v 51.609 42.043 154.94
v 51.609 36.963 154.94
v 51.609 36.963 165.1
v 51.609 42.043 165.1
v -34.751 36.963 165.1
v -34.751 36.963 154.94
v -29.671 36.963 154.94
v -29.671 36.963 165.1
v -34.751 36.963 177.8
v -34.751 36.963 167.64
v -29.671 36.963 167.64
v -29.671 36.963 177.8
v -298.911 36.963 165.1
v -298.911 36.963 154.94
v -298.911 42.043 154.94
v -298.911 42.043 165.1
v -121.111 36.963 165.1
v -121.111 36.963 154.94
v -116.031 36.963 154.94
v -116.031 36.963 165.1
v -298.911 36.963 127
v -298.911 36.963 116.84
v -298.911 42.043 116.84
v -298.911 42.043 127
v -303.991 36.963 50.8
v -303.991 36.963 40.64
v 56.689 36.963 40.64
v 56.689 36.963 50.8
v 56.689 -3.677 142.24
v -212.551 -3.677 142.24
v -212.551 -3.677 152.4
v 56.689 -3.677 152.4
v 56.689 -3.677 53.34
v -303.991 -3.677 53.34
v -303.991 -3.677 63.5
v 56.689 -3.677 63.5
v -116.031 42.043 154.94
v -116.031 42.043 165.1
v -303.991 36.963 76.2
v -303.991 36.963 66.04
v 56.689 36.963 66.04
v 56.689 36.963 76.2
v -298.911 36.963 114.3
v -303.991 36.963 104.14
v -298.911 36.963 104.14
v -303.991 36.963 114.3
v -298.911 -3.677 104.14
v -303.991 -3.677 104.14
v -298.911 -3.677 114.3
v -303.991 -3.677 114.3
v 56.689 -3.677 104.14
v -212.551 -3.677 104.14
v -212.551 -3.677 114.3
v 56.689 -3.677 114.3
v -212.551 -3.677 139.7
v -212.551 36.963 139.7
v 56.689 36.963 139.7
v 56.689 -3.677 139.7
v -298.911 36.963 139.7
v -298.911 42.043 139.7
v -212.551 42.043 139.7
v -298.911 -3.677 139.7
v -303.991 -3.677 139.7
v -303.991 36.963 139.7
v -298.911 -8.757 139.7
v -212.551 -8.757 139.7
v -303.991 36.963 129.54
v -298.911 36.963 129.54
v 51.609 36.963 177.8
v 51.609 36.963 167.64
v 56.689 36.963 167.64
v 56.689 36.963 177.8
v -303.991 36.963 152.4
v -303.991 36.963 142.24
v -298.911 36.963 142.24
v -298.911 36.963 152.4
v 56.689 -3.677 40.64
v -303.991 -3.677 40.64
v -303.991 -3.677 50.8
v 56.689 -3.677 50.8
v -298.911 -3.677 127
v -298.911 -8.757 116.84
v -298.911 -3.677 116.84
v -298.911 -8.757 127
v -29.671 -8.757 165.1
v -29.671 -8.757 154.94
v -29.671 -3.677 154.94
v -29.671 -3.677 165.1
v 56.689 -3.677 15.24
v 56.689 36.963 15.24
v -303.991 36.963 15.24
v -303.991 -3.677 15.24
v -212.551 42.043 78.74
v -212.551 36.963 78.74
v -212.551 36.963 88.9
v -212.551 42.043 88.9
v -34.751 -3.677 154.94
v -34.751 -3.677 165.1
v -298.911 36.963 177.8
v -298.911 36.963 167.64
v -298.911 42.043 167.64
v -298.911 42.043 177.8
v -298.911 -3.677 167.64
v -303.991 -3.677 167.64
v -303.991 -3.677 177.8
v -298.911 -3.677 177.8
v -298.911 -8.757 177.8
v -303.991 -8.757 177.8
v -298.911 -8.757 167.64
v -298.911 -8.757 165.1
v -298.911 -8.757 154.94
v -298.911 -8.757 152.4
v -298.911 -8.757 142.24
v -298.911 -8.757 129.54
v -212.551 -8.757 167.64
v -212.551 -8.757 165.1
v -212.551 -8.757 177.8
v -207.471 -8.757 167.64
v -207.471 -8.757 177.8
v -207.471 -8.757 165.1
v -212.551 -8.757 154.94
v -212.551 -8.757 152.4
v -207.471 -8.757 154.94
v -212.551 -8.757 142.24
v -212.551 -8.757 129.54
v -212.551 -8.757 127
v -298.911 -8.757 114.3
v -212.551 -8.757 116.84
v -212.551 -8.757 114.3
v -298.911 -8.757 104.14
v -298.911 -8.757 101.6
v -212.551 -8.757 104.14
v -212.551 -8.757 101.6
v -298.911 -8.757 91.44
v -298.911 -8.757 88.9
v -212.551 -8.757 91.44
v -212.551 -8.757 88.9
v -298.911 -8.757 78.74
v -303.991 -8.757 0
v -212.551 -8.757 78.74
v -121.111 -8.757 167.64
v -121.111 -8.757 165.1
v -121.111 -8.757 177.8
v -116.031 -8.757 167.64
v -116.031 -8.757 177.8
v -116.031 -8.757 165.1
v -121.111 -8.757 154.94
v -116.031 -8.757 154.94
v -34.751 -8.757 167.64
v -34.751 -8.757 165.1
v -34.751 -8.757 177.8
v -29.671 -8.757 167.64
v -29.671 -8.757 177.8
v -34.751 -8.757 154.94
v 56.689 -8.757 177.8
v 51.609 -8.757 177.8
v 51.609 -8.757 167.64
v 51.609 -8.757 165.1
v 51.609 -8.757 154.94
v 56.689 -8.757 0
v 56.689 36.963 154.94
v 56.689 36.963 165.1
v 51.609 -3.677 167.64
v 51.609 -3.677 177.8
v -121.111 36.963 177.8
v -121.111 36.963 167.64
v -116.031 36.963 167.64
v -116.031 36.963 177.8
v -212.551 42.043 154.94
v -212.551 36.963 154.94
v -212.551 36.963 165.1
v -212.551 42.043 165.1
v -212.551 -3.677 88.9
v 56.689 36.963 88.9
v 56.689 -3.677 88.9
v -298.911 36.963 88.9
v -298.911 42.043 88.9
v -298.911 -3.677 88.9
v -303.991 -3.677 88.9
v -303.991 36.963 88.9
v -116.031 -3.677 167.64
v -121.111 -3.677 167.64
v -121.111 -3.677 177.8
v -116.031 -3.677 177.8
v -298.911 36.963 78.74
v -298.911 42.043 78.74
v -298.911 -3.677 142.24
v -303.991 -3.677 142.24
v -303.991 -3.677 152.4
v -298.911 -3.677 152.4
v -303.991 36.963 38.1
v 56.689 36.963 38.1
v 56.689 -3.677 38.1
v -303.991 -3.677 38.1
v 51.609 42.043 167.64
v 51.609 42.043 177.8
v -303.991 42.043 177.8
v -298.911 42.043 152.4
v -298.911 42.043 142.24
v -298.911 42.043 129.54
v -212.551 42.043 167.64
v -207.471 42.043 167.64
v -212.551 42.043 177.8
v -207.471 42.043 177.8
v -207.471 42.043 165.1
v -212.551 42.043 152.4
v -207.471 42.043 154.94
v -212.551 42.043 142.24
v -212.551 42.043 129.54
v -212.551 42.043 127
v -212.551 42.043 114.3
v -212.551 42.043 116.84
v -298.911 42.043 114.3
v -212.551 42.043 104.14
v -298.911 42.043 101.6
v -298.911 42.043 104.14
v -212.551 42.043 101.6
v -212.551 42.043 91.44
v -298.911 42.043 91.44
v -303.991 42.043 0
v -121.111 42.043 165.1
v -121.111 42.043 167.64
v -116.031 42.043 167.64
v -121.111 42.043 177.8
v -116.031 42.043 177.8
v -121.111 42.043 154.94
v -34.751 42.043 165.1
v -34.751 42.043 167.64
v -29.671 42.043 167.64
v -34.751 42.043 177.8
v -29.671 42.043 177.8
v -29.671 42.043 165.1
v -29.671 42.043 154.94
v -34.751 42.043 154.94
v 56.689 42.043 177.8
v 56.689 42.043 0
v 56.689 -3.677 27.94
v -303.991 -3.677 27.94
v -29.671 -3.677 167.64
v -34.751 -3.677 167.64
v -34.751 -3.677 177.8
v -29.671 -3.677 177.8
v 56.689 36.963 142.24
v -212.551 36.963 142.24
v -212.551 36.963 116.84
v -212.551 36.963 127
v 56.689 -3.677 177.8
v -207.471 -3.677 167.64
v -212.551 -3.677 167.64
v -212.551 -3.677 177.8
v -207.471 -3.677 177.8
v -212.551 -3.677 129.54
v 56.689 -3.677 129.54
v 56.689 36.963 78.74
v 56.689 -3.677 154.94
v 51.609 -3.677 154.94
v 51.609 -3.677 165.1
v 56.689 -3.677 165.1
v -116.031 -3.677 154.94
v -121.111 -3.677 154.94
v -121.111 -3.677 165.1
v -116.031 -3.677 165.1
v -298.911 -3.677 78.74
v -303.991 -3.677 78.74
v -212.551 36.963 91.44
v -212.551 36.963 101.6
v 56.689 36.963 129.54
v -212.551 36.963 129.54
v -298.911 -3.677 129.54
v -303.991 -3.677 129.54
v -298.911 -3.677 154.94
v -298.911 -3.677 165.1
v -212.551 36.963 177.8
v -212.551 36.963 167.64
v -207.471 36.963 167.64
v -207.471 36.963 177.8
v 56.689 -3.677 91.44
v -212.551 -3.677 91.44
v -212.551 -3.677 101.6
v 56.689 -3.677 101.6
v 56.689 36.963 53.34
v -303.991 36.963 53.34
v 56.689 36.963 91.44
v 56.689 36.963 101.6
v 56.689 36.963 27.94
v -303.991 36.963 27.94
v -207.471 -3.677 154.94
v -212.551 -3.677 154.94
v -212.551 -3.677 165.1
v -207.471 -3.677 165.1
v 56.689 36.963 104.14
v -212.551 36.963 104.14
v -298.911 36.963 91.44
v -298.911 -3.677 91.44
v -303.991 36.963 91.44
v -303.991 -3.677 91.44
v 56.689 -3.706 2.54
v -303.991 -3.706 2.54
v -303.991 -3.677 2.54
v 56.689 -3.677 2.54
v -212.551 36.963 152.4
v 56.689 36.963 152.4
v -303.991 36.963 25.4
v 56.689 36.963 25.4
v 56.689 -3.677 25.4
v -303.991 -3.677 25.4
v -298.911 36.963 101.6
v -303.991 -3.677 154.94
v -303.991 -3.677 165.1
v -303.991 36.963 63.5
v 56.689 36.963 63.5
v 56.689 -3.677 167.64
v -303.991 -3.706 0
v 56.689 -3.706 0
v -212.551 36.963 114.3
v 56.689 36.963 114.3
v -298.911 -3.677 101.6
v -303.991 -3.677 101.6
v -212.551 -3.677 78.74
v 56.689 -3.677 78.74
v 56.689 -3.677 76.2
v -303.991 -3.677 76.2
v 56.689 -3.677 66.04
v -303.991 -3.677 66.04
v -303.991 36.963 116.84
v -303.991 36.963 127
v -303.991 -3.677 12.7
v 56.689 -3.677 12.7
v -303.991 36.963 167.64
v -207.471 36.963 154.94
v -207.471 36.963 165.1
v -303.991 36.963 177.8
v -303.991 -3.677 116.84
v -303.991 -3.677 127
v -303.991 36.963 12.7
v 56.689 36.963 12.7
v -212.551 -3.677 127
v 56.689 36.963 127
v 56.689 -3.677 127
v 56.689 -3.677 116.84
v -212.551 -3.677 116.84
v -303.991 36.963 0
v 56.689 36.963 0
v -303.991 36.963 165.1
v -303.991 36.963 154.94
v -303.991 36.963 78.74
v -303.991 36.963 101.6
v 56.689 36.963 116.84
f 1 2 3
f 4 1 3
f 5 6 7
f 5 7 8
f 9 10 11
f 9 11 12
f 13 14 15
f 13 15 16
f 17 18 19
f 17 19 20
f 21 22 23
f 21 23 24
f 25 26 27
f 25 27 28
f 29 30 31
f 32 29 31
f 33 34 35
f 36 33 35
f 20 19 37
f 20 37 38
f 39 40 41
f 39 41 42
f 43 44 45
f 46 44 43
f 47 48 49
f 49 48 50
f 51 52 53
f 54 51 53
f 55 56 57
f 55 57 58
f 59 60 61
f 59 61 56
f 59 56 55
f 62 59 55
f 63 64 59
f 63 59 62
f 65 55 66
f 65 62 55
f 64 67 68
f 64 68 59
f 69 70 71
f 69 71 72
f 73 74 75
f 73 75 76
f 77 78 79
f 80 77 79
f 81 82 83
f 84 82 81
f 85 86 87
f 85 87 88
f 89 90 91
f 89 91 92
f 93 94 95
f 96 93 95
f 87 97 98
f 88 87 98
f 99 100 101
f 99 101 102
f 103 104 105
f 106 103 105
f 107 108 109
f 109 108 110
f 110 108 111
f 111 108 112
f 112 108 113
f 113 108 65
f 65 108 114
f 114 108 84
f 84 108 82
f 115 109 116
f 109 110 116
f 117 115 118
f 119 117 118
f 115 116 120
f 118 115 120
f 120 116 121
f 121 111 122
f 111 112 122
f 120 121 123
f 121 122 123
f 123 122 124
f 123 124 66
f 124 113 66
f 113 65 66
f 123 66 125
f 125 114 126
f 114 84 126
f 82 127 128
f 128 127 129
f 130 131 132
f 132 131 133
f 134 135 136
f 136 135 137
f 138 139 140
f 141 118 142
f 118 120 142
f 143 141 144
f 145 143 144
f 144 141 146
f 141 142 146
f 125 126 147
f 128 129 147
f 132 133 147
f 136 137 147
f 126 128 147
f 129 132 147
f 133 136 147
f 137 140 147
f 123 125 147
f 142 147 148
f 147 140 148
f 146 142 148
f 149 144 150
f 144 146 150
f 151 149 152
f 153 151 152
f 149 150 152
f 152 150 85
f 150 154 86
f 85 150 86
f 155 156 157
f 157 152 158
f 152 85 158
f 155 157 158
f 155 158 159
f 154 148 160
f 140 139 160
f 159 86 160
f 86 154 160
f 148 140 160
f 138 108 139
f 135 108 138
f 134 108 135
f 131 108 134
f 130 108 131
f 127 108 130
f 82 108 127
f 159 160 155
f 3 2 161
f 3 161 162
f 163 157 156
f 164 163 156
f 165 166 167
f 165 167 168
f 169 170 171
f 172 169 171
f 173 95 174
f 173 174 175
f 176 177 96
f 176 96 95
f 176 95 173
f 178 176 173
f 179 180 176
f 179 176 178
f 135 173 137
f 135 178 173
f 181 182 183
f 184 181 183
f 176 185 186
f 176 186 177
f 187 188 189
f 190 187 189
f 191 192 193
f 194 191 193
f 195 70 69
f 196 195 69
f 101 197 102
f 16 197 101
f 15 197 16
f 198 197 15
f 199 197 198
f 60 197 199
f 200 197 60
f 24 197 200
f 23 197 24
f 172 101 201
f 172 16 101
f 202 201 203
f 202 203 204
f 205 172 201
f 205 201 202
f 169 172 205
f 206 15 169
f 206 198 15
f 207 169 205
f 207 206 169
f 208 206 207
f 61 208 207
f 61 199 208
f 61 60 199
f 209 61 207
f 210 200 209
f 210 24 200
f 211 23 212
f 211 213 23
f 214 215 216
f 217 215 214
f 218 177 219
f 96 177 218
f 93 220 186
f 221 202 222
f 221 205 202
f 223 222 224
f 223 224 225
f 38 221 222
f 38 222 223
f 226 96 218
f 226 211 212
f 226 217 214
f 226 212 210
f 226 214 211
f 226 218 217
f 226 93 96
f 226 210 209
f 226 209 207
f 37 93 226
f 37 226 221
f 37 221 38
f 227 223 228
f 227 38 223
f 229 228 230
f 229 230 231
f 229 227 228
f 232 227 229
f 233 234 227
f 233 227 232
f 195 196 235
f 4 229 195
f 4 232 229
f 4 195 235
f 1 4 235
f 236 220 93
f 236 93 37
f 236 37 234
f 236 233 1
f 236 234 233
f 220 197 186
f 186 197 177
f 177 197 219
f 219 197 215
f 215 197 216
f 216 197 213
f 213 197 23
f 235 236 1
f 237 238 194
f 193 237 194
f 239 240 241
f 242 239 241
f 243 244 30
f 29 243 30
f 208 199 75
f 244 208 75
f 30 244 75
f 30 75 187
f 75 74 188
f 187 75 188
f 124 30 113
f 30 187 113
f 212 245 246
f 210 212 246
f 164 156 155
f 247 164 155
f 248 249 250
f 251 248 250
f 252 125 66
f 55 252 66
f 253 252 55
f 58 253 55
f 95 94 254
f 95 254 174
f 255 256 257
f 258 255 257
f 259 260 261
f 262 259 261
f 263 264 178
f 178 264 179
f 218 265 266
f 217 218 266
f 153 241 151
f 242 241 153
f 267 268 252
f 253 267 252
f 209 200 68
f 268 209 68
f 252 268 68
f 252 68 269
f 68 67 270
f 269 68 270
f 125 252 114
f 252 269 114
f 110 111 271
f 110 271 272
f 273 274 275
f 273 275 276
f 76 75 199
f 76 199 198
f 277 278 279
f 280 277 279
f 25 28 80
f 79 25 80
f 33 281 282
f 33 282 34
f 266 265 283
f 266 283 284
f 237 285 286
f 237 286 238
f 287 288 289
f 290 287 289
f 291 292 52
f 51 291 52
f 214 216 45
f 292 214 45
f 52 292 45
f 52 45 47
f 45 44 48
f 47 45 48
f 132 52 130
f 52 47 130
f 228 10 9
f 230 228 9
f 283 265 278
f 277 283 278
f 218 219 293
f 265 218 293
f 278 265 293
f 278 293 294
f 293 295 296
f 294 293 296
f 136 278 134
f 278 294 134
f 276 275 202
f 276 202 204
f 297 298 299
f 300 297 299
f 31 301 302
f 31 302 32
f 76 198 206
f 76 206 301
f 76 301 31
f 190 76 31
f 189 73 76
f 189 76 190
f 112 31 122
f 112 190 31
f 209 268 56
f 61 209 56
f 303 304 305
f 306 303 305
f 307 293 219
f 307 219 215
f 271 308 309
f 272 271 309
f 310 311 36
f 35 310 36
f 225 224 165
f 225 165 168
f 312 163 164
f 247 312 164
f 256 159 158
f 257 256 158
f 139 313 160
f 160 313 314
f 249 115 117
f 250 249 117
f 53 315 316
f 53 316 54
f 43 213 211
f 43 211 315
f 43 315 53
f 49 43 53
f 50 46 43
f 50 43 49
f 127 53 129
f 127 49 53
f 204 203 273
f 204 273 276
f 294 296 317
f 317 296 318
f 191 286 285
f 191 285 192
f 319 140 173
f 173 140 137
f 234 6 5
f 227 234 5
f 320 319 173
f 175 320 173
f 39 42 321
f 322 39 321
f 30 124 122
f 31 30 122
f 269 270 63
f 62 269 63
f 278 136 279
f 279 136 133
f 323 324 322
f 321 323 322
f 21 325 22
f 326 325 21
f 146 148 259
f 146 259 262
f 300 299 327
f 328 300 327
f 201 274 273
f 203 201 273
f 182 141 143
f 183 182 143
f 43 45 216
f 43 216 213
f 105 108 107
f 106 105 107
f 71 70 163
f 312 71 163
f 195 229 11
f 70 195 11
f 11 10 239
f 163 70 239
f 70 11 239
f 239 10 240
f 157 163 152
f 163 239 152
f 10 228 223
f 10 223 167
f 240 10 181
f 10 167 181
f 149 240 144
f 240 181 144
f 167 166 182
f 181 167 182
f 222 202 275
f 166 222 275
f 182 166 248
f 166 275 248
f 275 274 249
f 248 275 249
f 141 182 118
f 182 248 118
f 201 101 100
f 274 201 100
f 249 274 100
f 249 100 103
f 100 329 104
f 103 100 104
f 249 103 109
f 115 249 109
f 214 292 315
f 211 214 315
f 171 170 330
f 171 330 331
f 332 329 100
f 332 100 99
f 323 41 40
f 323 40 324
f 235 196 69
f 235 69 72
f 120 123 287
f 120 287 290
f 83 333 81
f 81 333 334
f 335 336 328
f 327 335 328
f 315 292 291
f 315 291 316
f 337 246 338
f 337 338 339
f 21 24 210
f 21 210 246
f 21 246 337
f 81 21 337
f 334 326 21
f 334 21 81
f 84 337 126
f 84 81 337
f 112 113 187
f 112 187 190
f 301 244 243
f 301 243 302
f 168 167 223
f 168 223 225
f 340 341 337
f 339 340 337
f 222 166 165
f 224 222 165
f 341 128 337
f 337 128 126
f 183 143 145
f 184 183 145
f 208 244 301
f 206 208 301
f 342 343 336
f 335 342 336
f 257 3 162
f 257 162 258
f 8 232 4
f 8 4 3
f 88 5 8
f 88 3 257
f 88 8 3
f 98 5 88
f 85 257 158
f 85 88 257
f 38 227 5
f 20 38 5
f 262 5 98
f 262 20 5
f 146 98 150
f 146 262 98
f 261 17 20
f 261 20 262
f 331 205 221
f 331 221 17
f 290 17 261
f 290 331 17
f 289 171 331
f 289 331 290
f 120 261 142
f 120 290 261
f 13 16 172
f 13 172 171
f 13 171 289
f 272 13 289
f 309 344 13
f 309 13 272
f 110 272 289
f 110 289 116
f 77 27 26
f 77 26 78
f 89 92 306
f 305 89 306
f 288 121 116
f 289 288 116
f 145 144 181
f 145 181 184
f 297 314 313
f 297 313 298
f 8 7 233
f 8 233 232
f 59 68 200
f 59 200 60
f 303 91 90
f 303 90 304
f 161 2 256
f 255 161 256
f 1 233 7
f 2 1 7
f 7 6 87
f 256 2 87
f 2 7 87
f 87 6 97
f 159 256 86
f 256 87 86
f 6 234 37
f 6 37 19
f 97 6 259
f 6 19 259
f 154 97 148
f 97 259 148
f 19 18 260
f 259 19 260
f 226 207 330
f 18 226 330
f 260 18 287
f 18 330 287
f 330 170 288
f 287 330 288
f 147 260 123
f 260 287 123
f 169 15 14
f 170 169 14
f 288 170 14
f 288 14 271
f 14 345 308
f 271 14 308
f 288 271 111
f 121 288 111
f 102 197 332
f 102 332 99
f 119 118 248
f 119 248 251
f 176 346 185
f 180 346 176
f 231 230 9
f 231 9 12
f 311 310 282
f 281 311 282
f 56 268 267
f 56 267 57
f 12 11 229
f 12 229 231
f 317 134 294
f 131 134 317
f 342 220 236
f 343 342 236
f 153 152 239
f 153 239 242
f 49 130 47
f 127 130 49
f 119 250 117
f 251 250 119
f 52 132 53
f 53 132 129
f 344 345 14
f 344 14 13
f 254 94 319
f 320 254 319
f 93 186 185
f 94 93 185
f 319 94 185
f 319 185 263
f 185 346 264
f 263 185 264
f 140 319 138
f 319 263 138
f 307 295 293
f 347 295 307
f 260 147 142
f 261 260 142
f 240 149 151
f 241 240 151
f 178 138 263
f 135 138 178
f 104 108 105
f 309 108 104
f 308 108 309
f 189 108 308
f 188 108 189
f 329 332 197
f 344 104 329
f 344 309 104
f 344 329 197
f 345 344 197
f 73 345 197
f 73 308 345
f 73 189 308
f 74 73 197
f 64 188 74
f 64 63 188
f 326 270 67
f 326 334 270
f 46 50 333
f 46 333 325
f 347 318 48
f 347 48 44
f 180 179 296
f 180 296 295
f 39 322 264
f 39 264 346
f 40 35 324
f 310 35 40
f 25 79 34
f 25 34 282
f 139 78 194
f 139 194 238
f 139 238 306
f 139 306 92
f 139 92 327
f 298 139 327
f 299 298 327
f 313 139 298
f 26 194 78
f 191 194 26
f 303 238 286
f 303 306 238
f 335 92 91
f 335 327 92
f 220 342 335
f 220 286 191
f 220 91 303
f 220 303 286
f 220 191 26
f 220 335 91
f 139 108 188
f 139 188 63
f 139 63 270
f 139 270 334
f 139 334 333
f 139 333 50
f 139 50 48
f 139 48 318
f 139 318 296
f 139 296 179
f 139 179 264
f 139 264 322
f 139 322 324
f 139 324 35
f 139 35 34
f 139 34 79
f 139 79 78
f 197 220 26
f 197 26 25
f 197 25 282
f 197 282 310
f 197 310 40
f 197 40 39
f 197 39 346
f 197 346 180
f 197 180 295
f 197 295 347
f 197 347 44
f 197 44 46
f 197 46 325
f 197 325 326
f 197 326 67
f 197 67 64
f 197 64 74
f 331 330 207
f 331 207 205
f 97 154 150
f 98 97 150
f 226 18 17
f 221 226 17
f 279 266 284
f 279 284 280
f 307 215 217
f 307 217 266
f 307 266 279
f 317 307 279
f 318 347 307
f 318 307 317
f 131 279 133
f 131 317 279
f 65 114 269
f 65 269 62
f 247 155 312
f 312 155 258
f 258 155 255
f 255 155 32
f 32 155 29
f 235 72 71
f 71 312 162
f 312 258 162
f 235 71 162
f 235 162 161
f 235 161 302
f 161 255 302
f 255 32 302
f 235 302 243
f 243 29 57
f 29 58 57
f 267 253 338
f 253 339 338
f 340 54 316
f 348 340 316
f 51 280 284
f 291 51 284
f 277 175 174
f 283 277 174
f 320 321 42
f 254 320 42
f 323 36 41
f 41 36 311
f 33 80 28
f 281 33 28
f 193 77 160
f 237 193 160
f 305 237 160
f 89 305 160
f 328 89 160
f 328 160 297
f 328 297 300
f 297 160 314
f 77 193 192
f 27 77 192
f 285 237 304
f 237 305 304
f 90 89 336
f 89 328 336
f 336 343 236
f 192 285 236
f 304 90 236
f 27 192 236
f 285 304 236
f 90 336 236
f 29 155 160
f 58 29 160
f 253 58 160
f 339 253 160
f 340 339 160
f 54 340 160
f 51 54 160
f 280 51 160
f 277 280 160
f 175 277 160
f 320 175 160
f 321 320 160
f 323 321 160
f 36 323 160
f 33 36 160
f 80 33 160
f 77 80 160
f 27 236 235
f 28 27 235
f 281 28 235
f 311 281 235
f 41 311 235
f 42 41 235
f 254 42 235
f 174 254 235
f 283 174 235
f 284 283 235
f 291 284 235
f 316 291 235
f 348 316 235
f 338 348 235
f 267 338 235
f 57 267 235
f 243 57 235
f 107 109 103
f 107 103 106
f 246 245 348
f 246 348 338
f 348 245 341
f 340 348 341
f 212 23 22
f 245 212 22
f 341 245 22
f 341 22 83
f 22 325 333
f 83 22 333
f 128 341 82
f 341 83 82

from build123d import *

# Parameters (mm, degrees)
F0_W     = 360.68
F0_H     = 50.8
F1_DEPTH = 177.8
F2_W     = 40.64
F2_H     = 10.16
F2_H_2   = 7.62
F2_H_3   = 2.54
F3_DEPTH = 360.681
F4_W     = 86.36
F4_H     = 10.16
F4_W_2   = 81.28
F5_DEPTH = 50.801
F7_DEPTH = 360.681


with BuildPart() as f1:
    # F0 (on Top) → F1 (new body)
    with BuildSketch(Plane.XY):
        with Locations((-123.650887, 16.643145)):
            Rectangle(F0_W, F0_H)
    extrude(amount=F1_DEPTH)

    # F2 (on face) → F3 (cut, through all)
    with BuildSketch(Plane(origin=(-303.990887, 0, 0), x_dir=(0, -1, 0), z_dir=(-1, 0, 0))):
        with Locations((-16.643145, 7.62)):
            Rectangle(F2_W, F2_H)
        with Locations((-16.643145, 20.32)):
            Rectangle(F2_W, F2_H)
        with Locations((-16.643145, 33.02)):
            Rectangle(F2_W, F2_H)
        with Locations((-16.643145, 45.72)):
            Rectangle(F2_W, F2_H)
        with Locations((-16.643145, 57.15)):
            Rectangle(F2_W, F2_H_2)
        with Locations((-16.643145, 62.23)):
            Rectangle(F2_W, F2_H_3)
        with Locations((-16.643145, 71.12)):
            Rectangle(F2_W, F2_H)
        with Locations((-16.643145, 83.82)):
            Rectangle(F2_W, F2_H)
        with Locations((-16.643145, 96.52)):
            Rectangle(F2_W, F2_H)
        with Locations((-16.643145, 109.22)):
            Rectangle(F2_W, F2_H)
        with Locations((-16.643145, 121.92)):
            Rectangle(F2_W, F2_H)
        with Locations((-16.643145, 134.62)):
            Rectangle(F2_W, F2_H)
        with Locations((-16.643145, 147.32)):
            Rectangle(F2_W, F2_H)
        with Locations((-16.643145, 160.02)):
            Rectangle(F2_W, F2_H)
        with Locations((-16.643145, 172.72)):
            Rectangle(F2_W, F2_H)
    extrude(amount=-F3_DEPTH, mode=Mode.SUBTRACT)

    # F4 (on face) → F5 (cut, through all)
    with BuildSketch(Plane.XZ.offset(8.756855)):
        with Locations((-255.730887, 172.72)):
            Rectangle(F4_W, F4_H)
        with Locations((-164.290887, 172.72)):
            Rectangle(F4_W, F4_H)
        with Locations((-164.290887, 160.02)):
            Rectangle(F4_W, F4_H)
        with Locations((-75.390887, 172.72)):
            Rectangle(F4_W_2, F4_H)
        with Locations((-75.390887, 160.02)):
            Rectangle(F4_W_2, F4_H)
        with Locations((10.969113, 172.72)):
            Rectangle(F4_W_2, F4_H)
        with Locations((10.969113, 160.02)):
            Rectangle(F4_W_2, F4_H)
        with Locations((-255.730887, 160.02)):
            Rectangle(F4_W, F4_H)
        with Locations((-255.730887, 147.32)):
            Rectangle(F4_W, F4_H)
        with Locations((-255.730887, 134.62)):
            Rectangle(F4_W, F4_H)
        with Locations((-255.730887, 121.92)):
            Rectangle(F4_W, F4_H)
        with Locations((-255.730887, 109.22)):
            Rectangle(F4_W, F4_H)
        with Locations((-255.730887, 96.52)):
            Rectangle(F4_W, F4_H)
        with Locations((-255.730887, 83.82)):
            Rectangle(F4_W, F4_H)
    extrude(amount=-F5_DEPTH, mode=Mode.SUBTRACT)

    # F6 (on face) → F7 (cut, through all)
    with BuildSketch(Plane(origin=(-303.990887, 0, 0), x_dir=(0, -1, 0), z_dir=(-1, 0, 0))):
        Polygon((3.676855, 2.54), (-36.963145, 2.54), (-36.963145, 0), (3.705695, 0), (3.705695, 2.54), align=None)
    extrude(amount=-F7_DEPTH, mode=Mode.SUBTRACT)


solid = f1.part
